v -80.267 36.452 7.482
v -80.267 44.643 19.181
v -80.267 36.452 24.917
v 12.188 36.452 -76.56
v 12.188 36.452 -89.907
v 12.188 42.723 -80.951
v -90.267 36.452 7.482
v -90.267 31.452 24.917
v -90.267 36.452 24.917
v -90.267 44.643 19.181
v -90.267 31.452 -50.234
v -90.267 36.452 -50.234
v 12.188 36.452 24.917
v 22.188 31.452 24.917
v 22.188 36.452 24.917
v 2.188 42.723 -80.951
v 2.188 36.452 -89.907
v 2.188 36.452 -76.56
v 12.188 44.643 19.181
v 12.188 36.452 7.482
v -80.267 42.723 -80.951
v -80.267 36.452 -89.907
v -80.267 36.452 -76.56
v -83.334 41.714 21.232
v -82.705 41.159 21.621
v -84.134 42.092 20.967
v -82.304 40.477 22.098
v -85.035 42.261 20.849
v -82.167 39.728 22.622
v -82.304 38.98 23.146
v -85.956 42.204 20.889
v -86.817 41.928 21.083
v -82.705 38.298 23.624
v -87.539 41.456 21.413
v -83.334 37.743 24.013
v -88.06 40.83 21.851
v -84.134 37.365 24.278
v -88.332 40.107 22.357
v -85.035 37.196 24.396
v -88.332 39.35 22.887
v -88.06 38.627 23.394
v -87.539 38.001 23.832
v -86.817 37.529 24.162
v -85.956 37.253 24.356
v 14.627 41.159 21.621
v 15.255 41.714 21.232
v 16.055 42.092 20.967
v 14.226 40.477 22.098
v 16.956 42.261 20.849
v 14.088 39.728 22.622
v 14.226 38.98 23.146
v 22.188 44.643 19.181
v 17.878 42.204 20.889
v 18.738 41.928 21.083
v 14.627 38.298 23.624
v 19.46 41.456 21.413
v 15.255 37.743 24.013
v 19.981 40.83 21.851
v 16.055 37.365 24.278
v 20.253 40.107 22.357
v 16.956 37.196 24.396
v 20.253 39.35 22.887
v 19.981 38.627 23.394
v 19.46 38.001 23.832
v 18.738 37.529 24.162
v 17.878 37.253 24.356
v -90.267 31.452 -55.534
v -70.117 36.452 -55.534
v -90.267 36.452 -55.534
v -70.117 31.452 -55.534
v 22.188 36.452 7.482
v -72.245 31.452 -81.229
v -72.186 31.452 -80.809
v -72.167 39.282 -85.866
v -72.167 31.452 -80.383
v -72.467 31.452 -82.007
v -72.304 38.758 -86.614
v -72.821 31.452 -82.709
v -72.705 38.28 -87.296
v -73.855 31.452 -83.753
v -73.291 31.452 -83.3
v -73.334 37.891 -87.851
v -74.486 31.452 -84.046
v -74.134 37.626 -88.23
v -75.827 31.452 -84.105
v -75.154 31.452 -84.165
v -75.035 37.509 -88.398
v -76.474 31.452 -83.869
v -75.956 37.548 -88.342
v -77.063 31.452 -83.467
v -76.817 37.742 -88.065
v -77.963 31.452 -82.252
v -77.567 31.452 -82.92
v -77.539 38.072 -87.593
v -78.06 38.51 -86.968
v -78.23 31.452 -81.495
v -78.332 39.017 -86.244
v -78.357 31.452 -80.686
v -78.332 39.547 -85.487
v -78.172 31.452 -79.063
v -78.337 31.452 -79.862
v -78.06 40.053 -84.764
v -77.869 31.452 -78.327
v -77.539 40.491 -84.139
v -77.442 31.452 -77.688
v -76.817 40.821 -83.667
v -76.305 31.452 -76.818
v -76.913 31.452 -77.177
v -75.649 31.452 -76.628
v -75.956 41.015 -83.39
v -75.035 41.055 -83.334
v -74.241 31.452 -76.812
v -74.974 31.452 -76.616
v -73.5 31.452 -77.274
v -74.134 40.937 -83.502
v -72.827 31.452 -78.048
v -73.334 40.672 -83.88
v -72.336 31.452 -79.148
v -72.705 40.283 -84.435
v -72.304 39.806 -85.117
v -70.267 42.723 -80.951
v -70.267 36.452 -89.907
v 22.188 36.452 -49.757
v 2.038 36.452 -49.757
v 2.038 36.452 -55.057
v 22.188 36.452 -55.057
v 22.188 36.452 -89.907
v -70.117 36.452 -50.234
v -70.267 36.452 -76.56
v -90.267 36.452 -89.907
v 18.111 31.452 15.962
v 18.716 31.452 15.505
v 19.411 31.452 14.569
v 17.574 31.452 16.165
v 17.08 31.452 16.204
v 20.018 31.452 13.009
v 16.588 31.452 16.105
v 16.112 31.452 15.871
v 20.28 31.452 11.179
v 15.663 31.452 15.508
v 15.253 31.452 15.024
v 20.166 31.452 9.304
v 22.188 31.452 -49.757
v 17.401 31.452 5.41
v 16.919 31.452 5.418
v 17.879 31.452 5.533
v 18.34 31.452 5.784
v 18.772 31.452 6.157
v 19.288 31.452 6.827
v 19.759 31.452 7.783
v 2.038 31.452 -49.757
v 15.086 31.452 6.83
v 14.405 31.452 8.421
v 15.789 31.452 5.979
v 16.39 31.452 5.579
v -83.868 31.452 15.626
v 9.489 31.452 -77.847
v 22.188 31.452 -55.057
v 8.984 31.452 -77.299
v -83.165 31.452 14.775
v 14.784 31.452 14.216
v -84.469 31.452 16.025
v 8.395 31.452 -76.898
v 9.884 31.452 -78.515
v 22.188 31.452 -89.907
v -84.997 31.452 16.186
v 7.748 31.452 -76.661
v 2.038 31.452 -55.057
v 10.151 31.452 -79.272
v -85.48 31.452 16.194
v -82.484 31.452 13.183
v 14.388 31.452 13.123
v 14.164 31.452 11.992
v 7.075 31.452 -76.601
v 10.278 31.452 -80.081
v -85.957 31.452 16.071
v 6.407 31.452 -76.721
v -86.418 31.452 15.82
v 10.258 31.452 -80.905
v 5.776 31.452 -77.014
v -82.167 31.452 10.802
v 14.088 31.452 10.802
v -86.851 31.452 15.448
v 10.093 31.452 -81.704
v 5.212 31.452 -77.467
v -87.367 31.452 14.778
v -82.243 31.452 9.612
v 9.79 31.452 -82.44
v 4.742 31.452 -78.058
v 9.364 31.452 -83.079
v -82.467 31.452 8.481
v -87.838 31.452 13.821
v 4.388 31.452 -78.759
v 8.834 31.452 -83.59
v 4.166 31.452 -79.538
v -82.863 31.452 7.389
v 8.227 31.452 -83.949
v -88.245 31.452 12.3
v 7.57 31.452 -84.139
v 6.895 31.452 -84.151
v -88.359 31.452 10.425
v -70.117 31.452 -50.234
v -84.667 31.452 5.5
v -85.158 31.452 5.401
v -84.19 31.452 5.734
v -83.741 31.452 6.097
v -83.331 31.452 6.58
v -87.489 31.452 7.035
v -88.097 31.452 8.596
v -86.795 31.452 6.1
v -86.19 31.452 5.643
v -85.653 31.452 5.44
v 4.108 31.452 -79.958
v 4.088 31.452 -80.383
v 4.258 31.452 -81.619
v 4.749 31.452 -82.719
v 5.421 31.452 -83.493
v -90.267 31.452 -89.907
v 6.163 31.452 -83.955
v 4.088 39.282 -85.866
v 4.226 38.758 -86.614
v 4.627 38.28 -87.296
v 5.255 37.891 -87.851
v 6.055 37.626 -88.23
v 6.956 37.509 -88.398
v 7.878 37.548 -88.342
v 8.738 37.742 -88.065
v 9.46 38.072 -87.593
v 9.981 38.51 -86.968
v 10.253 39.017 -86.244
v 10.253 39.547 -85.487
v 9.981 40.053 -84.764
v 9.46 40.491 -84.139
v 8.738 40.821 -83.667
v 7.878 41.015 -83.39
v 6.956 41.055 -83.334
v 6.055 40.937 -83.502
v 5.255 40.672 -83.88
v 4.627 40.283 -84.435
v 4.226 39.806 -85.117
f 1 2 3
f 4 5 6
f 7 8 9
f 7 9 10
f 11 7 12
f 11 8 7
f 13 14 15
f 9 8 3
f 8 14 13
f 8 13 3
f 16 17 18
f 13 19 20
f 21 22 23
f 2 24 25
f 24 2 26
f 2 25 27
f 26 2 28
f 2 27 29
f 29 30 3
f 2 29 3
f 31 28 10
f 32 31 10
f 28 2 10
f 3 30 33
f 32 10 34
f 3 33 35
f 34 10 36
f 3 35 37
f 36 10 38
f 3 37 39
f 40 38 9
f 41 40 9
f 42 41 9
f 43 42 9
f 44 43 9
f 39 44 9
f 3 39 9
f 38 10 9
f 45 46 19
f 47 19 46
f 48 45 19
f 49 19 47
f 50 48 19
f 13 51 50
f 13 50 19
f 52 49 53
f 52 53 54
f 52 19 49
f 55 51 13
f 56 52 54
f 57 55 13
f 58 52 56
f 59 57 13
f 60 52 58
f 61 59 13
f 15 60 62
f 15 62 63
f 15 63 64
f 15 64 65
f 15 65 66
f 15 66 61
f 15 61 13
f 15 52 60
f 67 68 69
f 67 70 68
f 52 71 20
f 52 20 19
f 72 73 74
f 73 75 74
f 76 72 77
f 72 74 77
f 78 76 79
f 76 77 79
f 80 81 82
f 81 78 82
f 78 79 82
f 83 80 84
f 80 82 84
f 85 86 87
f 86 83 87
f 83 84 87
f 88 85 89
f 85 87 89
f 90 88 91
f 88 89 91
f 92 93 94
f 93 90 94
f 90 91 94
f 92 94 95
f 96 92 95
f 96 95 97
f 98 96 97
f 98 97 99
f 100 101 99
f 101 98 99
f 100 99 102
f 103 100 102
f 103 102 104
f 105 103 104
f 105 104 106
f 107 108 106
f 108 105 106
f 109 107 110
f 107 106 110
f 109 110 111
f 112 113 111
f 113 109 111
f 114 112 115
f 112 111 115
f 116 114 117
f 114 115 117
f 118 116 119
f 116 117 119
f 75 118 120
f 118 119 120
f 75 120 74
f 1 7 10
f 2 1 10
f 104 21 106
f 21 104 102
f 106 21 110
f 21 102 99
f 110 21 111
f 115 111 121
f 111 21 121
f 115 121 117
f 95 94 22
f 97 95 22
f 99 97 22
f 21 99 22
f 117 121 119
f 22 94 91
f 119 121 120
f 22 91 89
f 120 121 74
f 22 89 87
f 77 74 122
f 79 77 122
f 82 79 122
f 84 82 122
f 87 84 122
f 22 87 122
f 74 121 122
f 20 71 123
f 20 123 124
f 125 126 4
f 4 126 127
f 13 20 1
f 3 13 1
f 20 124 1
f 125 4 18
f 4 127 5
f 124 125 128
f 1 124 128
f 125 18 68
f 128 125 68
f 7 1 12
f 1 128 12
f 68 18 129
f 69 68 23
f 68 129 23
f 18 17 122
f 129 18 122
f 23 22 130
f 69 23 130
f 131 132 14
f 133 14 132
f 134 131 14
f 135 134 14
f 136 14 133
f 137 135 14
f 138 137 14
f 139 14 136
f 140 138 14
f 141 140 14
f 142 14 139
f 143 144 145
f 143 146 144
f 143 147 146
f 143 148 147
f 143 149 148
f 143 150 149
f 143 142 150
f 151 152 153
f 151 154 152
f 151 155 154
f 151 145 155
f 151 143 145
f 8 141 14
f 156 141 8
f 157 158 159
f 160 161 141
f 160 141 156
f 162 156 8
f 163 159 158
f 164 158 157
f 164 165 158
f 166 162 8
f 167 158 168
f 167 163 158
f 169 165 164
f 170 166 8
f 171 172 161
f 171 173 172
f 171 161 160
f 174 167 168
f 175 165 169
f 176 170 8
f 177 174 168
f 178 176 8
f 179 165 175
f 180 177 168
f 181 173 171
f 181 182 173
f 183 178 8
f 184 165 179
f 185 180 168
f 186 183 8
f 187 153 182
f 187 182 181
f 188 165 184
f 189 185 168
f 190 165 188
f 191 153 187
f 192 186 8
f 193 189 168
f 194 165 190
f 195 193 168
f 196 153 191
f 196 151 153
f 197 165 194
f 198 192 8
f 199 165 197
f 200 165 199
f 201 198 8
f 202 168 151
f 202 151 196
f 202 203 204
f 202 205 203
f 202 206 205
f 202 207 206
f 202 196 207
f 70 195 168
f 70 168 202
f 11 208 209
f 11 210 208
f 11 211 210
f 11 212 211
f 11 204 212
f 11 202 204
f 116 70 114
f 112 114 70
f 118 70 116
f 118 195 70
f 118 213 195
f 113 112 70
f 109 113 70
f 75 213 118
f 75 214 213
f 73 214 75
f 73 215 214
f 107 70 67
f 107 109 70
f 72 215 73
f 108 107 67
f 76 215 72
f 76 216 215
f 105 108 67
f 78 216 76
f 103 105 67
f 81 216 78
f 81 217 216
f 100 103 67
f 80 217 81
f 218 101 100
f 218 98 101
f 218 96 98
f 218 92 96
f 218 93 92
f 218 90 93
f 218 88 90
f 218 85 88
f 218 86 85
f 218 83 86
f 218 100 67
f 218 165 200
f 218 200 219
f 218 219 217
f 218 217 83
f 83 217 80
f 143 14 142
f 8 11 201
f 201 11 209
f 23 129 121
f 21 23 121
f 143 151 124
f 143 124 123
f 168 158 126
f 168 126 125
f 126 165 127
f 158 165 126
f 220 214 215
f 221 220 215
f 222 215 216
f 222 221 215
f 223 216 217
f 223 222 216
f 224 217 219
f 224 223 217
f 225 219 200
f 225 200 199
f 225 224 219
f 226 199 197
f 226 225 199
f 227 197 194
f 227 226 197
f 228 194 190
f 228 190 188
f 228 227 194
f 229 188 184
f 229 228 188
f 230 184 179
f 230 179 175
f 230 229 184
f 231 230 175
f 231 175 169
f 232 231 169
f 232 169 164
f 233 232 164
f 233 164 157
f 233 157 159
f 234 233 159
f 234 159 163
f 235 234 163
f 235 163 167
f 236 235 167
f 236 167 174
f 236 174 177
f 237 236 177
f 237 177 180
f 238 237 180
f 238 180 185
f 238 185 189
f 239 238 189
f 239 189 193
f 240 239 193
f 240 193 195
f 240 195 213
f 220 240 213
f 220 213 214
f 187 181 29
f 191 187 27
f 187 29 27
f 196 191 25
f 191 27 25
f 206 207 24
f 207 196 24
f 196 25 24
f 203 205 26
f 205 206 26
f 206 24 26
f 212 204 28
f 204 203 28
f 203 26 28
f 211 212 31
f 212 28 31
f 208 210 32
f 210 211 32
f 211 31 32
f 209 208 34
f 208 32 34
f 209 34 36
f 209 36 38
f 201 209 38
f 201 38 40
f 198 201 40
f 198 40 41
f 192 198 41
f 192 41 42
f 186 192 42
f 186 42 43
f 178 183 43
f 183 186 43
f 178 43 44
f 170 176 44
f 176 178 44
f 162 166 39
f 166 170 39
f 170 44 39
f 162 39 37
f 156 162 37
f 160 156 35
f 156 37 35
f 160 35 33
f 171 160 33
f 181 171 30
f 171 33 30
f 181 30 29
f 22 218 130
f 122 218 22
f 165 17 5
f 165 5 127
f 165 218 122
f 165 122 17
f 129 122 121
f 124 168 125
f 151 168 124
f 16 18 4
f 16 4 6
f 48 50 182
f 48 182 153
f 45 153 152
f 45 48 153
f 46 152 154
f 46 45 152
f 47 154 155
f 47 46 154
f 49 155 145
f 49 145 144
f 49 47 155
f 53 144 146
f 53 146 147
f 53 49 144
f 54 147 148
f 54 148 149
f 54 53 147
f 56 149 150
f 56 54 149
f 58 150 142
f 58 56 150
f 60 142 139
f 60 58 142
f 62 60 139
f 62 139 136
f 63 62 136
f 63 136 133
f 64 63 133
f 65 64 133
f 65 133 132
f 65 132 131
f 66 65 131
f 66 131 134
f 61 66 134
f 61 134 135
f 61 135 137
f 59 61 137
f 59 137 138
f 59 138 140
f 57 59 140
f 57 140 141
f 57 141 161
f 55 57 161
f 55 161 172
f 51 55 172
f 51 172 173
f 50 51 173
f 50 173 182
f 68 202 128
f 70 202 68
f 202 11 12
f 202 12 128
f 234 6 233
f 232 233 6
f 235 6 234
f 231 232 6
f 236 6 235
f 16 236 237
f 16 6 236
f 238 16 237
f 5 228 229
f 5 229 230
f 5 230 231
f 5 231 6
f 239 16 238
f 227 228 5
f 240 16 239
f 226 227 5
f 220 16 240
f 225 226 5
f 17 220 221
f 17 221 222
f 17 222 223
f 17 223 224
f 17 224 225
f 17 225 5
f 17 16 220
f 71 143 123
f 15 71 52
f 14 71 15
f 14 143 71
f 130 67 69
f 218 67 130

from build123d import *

# Parameters (mm, degrees)
BOSS_EXTRUDE1_DEPTH = 2.5
BOSS_EXTRUDE2_DEPTH = 10
SKETCH3_R           = 3.1
CUT_EXTRUDE1_DEPTH  = 97.926231277
BOSS_EXTRUDE3_DEPTH = 10
SKETCH5_R           = 3.1
CUT_EXTRUDE2_DEPTH  = 73.924932584
SKETCH6_W           = 5.175957564
SKETCH6_H           = 5
CUT_EXTRUDE3_DEPTH  = 113.454585159


with BuildPart() as part:
    # Sketch1 → Boss-Extrude1 (new body, symmetric)
    with BuildSketch(Plane(origin=(-32.81203924, 33.9517387, -54.90733973), x_dir=(-1, 0, 0), z_dir=(0, -1, 0))):
        Polygon((57.454585159, 35), (-55, 35), (-55, 0.15), (-34.85, 0.15), (-34.85, -5.15), (-55, -5.15), (-55, -85), (57.454585159, -85), (57.454585159, -4.673151813), (37.304585159, -4.673151813), (37.304585159, 0.626848187), (57.454585159, 0.626848187), align=None)
    extrude(amount=BOSS_EXTRUDE1_DEPTH, both=True)

    # Sketch2 → Boss-Extrude2 (add)
    with BuildSketch(Plane.ZY.offset(90.266624399)):
        Polygon((7.48223475, 36.4517387), (19.180938343, 44.643259143), (24.916702706, 36.4517387), align=None)
    boss_extrude2 = extrude(amount=-BOSS_EXTRUDE2_DEPTH)

    # Sketch3 → Cut-Extrude1 (cut, through all)
    with BuildSketch(Plane(origin=(0, 23.699275736, 33.846073404), x_dir=(1, 0, 0), z_dir=(0, 0.573576436, 0.819152044))):
        with Locations((-85.266624399, 19.56788273)):
            Circle(SKETCH3_R)
    cut_extrude1 = extrude(amount=-CUT_EXTRUDE1_DEPTH, mode=Mode.SUBTRACT)

    # Sketch4 → Boss-Extrude3 (add)
    with BuildSketch(Plane(origin=(-70.266624399, 0, 0), x_dir=(0, 0, -1), z_dir=(1, 0, 0))):
        Polygon((76.559676692, 36.4517387), (80.950923398, 42.723088931), (89.90733973, 36.4517387), align=None)
    boss_extrude3 = extrude(amount=-BOSS_EXTRUDE3_DEPTH)

    # Sketch5 → Cut-Extrude2 (cut, through all)
    with BuildSketch(Plane(origin=(0, 66.702115647, -46.70532419), x_dir=(1, 0, 0), z_dir=(0, 0.819152044, -0.573576436))):
        with Locations((-75.266624399, 47.80615729)):
            Circle(SKETCH5_R)
    cut_extrude2 = extrude(amount=-CUT_EXTRUDE2_DEPTH, mode=Mode.SUBTRACT)

    # Mirror1: Boss-Extrude2, Cut-Extrude1, Boss-Extrude3, Cut-Extrude2 across plane
    add(boss_extrude2.mirror(Plane.ZY.offset(34.03933182)))
    add(cut_extrude1.mirror(Plane.ZY.offset(34.03933182)), mode=Mode.SUBTRACT)
    add(boss_extrude3.mirror(Plane.ZY.offset(34.03933182)))
    add(cut_extrude2.mirror(Plane.ZY.offset(34.03933182)), mode=Mode.SUBTRACT)

    # Sketch6 → Cut-Extrude3 (cut, through all)
    with BuildSketch(Plane.ZY.offset(90.266624399)):
        with Locations((27.504681488, 33.9517387)):
            Rectangle(SKETCH6_W, SKETCH6_H)
    extrude(amount=-CUT_EXTRUDE3_DEPTH, mode=Mode.SUBTRACT)


solid = part.part
